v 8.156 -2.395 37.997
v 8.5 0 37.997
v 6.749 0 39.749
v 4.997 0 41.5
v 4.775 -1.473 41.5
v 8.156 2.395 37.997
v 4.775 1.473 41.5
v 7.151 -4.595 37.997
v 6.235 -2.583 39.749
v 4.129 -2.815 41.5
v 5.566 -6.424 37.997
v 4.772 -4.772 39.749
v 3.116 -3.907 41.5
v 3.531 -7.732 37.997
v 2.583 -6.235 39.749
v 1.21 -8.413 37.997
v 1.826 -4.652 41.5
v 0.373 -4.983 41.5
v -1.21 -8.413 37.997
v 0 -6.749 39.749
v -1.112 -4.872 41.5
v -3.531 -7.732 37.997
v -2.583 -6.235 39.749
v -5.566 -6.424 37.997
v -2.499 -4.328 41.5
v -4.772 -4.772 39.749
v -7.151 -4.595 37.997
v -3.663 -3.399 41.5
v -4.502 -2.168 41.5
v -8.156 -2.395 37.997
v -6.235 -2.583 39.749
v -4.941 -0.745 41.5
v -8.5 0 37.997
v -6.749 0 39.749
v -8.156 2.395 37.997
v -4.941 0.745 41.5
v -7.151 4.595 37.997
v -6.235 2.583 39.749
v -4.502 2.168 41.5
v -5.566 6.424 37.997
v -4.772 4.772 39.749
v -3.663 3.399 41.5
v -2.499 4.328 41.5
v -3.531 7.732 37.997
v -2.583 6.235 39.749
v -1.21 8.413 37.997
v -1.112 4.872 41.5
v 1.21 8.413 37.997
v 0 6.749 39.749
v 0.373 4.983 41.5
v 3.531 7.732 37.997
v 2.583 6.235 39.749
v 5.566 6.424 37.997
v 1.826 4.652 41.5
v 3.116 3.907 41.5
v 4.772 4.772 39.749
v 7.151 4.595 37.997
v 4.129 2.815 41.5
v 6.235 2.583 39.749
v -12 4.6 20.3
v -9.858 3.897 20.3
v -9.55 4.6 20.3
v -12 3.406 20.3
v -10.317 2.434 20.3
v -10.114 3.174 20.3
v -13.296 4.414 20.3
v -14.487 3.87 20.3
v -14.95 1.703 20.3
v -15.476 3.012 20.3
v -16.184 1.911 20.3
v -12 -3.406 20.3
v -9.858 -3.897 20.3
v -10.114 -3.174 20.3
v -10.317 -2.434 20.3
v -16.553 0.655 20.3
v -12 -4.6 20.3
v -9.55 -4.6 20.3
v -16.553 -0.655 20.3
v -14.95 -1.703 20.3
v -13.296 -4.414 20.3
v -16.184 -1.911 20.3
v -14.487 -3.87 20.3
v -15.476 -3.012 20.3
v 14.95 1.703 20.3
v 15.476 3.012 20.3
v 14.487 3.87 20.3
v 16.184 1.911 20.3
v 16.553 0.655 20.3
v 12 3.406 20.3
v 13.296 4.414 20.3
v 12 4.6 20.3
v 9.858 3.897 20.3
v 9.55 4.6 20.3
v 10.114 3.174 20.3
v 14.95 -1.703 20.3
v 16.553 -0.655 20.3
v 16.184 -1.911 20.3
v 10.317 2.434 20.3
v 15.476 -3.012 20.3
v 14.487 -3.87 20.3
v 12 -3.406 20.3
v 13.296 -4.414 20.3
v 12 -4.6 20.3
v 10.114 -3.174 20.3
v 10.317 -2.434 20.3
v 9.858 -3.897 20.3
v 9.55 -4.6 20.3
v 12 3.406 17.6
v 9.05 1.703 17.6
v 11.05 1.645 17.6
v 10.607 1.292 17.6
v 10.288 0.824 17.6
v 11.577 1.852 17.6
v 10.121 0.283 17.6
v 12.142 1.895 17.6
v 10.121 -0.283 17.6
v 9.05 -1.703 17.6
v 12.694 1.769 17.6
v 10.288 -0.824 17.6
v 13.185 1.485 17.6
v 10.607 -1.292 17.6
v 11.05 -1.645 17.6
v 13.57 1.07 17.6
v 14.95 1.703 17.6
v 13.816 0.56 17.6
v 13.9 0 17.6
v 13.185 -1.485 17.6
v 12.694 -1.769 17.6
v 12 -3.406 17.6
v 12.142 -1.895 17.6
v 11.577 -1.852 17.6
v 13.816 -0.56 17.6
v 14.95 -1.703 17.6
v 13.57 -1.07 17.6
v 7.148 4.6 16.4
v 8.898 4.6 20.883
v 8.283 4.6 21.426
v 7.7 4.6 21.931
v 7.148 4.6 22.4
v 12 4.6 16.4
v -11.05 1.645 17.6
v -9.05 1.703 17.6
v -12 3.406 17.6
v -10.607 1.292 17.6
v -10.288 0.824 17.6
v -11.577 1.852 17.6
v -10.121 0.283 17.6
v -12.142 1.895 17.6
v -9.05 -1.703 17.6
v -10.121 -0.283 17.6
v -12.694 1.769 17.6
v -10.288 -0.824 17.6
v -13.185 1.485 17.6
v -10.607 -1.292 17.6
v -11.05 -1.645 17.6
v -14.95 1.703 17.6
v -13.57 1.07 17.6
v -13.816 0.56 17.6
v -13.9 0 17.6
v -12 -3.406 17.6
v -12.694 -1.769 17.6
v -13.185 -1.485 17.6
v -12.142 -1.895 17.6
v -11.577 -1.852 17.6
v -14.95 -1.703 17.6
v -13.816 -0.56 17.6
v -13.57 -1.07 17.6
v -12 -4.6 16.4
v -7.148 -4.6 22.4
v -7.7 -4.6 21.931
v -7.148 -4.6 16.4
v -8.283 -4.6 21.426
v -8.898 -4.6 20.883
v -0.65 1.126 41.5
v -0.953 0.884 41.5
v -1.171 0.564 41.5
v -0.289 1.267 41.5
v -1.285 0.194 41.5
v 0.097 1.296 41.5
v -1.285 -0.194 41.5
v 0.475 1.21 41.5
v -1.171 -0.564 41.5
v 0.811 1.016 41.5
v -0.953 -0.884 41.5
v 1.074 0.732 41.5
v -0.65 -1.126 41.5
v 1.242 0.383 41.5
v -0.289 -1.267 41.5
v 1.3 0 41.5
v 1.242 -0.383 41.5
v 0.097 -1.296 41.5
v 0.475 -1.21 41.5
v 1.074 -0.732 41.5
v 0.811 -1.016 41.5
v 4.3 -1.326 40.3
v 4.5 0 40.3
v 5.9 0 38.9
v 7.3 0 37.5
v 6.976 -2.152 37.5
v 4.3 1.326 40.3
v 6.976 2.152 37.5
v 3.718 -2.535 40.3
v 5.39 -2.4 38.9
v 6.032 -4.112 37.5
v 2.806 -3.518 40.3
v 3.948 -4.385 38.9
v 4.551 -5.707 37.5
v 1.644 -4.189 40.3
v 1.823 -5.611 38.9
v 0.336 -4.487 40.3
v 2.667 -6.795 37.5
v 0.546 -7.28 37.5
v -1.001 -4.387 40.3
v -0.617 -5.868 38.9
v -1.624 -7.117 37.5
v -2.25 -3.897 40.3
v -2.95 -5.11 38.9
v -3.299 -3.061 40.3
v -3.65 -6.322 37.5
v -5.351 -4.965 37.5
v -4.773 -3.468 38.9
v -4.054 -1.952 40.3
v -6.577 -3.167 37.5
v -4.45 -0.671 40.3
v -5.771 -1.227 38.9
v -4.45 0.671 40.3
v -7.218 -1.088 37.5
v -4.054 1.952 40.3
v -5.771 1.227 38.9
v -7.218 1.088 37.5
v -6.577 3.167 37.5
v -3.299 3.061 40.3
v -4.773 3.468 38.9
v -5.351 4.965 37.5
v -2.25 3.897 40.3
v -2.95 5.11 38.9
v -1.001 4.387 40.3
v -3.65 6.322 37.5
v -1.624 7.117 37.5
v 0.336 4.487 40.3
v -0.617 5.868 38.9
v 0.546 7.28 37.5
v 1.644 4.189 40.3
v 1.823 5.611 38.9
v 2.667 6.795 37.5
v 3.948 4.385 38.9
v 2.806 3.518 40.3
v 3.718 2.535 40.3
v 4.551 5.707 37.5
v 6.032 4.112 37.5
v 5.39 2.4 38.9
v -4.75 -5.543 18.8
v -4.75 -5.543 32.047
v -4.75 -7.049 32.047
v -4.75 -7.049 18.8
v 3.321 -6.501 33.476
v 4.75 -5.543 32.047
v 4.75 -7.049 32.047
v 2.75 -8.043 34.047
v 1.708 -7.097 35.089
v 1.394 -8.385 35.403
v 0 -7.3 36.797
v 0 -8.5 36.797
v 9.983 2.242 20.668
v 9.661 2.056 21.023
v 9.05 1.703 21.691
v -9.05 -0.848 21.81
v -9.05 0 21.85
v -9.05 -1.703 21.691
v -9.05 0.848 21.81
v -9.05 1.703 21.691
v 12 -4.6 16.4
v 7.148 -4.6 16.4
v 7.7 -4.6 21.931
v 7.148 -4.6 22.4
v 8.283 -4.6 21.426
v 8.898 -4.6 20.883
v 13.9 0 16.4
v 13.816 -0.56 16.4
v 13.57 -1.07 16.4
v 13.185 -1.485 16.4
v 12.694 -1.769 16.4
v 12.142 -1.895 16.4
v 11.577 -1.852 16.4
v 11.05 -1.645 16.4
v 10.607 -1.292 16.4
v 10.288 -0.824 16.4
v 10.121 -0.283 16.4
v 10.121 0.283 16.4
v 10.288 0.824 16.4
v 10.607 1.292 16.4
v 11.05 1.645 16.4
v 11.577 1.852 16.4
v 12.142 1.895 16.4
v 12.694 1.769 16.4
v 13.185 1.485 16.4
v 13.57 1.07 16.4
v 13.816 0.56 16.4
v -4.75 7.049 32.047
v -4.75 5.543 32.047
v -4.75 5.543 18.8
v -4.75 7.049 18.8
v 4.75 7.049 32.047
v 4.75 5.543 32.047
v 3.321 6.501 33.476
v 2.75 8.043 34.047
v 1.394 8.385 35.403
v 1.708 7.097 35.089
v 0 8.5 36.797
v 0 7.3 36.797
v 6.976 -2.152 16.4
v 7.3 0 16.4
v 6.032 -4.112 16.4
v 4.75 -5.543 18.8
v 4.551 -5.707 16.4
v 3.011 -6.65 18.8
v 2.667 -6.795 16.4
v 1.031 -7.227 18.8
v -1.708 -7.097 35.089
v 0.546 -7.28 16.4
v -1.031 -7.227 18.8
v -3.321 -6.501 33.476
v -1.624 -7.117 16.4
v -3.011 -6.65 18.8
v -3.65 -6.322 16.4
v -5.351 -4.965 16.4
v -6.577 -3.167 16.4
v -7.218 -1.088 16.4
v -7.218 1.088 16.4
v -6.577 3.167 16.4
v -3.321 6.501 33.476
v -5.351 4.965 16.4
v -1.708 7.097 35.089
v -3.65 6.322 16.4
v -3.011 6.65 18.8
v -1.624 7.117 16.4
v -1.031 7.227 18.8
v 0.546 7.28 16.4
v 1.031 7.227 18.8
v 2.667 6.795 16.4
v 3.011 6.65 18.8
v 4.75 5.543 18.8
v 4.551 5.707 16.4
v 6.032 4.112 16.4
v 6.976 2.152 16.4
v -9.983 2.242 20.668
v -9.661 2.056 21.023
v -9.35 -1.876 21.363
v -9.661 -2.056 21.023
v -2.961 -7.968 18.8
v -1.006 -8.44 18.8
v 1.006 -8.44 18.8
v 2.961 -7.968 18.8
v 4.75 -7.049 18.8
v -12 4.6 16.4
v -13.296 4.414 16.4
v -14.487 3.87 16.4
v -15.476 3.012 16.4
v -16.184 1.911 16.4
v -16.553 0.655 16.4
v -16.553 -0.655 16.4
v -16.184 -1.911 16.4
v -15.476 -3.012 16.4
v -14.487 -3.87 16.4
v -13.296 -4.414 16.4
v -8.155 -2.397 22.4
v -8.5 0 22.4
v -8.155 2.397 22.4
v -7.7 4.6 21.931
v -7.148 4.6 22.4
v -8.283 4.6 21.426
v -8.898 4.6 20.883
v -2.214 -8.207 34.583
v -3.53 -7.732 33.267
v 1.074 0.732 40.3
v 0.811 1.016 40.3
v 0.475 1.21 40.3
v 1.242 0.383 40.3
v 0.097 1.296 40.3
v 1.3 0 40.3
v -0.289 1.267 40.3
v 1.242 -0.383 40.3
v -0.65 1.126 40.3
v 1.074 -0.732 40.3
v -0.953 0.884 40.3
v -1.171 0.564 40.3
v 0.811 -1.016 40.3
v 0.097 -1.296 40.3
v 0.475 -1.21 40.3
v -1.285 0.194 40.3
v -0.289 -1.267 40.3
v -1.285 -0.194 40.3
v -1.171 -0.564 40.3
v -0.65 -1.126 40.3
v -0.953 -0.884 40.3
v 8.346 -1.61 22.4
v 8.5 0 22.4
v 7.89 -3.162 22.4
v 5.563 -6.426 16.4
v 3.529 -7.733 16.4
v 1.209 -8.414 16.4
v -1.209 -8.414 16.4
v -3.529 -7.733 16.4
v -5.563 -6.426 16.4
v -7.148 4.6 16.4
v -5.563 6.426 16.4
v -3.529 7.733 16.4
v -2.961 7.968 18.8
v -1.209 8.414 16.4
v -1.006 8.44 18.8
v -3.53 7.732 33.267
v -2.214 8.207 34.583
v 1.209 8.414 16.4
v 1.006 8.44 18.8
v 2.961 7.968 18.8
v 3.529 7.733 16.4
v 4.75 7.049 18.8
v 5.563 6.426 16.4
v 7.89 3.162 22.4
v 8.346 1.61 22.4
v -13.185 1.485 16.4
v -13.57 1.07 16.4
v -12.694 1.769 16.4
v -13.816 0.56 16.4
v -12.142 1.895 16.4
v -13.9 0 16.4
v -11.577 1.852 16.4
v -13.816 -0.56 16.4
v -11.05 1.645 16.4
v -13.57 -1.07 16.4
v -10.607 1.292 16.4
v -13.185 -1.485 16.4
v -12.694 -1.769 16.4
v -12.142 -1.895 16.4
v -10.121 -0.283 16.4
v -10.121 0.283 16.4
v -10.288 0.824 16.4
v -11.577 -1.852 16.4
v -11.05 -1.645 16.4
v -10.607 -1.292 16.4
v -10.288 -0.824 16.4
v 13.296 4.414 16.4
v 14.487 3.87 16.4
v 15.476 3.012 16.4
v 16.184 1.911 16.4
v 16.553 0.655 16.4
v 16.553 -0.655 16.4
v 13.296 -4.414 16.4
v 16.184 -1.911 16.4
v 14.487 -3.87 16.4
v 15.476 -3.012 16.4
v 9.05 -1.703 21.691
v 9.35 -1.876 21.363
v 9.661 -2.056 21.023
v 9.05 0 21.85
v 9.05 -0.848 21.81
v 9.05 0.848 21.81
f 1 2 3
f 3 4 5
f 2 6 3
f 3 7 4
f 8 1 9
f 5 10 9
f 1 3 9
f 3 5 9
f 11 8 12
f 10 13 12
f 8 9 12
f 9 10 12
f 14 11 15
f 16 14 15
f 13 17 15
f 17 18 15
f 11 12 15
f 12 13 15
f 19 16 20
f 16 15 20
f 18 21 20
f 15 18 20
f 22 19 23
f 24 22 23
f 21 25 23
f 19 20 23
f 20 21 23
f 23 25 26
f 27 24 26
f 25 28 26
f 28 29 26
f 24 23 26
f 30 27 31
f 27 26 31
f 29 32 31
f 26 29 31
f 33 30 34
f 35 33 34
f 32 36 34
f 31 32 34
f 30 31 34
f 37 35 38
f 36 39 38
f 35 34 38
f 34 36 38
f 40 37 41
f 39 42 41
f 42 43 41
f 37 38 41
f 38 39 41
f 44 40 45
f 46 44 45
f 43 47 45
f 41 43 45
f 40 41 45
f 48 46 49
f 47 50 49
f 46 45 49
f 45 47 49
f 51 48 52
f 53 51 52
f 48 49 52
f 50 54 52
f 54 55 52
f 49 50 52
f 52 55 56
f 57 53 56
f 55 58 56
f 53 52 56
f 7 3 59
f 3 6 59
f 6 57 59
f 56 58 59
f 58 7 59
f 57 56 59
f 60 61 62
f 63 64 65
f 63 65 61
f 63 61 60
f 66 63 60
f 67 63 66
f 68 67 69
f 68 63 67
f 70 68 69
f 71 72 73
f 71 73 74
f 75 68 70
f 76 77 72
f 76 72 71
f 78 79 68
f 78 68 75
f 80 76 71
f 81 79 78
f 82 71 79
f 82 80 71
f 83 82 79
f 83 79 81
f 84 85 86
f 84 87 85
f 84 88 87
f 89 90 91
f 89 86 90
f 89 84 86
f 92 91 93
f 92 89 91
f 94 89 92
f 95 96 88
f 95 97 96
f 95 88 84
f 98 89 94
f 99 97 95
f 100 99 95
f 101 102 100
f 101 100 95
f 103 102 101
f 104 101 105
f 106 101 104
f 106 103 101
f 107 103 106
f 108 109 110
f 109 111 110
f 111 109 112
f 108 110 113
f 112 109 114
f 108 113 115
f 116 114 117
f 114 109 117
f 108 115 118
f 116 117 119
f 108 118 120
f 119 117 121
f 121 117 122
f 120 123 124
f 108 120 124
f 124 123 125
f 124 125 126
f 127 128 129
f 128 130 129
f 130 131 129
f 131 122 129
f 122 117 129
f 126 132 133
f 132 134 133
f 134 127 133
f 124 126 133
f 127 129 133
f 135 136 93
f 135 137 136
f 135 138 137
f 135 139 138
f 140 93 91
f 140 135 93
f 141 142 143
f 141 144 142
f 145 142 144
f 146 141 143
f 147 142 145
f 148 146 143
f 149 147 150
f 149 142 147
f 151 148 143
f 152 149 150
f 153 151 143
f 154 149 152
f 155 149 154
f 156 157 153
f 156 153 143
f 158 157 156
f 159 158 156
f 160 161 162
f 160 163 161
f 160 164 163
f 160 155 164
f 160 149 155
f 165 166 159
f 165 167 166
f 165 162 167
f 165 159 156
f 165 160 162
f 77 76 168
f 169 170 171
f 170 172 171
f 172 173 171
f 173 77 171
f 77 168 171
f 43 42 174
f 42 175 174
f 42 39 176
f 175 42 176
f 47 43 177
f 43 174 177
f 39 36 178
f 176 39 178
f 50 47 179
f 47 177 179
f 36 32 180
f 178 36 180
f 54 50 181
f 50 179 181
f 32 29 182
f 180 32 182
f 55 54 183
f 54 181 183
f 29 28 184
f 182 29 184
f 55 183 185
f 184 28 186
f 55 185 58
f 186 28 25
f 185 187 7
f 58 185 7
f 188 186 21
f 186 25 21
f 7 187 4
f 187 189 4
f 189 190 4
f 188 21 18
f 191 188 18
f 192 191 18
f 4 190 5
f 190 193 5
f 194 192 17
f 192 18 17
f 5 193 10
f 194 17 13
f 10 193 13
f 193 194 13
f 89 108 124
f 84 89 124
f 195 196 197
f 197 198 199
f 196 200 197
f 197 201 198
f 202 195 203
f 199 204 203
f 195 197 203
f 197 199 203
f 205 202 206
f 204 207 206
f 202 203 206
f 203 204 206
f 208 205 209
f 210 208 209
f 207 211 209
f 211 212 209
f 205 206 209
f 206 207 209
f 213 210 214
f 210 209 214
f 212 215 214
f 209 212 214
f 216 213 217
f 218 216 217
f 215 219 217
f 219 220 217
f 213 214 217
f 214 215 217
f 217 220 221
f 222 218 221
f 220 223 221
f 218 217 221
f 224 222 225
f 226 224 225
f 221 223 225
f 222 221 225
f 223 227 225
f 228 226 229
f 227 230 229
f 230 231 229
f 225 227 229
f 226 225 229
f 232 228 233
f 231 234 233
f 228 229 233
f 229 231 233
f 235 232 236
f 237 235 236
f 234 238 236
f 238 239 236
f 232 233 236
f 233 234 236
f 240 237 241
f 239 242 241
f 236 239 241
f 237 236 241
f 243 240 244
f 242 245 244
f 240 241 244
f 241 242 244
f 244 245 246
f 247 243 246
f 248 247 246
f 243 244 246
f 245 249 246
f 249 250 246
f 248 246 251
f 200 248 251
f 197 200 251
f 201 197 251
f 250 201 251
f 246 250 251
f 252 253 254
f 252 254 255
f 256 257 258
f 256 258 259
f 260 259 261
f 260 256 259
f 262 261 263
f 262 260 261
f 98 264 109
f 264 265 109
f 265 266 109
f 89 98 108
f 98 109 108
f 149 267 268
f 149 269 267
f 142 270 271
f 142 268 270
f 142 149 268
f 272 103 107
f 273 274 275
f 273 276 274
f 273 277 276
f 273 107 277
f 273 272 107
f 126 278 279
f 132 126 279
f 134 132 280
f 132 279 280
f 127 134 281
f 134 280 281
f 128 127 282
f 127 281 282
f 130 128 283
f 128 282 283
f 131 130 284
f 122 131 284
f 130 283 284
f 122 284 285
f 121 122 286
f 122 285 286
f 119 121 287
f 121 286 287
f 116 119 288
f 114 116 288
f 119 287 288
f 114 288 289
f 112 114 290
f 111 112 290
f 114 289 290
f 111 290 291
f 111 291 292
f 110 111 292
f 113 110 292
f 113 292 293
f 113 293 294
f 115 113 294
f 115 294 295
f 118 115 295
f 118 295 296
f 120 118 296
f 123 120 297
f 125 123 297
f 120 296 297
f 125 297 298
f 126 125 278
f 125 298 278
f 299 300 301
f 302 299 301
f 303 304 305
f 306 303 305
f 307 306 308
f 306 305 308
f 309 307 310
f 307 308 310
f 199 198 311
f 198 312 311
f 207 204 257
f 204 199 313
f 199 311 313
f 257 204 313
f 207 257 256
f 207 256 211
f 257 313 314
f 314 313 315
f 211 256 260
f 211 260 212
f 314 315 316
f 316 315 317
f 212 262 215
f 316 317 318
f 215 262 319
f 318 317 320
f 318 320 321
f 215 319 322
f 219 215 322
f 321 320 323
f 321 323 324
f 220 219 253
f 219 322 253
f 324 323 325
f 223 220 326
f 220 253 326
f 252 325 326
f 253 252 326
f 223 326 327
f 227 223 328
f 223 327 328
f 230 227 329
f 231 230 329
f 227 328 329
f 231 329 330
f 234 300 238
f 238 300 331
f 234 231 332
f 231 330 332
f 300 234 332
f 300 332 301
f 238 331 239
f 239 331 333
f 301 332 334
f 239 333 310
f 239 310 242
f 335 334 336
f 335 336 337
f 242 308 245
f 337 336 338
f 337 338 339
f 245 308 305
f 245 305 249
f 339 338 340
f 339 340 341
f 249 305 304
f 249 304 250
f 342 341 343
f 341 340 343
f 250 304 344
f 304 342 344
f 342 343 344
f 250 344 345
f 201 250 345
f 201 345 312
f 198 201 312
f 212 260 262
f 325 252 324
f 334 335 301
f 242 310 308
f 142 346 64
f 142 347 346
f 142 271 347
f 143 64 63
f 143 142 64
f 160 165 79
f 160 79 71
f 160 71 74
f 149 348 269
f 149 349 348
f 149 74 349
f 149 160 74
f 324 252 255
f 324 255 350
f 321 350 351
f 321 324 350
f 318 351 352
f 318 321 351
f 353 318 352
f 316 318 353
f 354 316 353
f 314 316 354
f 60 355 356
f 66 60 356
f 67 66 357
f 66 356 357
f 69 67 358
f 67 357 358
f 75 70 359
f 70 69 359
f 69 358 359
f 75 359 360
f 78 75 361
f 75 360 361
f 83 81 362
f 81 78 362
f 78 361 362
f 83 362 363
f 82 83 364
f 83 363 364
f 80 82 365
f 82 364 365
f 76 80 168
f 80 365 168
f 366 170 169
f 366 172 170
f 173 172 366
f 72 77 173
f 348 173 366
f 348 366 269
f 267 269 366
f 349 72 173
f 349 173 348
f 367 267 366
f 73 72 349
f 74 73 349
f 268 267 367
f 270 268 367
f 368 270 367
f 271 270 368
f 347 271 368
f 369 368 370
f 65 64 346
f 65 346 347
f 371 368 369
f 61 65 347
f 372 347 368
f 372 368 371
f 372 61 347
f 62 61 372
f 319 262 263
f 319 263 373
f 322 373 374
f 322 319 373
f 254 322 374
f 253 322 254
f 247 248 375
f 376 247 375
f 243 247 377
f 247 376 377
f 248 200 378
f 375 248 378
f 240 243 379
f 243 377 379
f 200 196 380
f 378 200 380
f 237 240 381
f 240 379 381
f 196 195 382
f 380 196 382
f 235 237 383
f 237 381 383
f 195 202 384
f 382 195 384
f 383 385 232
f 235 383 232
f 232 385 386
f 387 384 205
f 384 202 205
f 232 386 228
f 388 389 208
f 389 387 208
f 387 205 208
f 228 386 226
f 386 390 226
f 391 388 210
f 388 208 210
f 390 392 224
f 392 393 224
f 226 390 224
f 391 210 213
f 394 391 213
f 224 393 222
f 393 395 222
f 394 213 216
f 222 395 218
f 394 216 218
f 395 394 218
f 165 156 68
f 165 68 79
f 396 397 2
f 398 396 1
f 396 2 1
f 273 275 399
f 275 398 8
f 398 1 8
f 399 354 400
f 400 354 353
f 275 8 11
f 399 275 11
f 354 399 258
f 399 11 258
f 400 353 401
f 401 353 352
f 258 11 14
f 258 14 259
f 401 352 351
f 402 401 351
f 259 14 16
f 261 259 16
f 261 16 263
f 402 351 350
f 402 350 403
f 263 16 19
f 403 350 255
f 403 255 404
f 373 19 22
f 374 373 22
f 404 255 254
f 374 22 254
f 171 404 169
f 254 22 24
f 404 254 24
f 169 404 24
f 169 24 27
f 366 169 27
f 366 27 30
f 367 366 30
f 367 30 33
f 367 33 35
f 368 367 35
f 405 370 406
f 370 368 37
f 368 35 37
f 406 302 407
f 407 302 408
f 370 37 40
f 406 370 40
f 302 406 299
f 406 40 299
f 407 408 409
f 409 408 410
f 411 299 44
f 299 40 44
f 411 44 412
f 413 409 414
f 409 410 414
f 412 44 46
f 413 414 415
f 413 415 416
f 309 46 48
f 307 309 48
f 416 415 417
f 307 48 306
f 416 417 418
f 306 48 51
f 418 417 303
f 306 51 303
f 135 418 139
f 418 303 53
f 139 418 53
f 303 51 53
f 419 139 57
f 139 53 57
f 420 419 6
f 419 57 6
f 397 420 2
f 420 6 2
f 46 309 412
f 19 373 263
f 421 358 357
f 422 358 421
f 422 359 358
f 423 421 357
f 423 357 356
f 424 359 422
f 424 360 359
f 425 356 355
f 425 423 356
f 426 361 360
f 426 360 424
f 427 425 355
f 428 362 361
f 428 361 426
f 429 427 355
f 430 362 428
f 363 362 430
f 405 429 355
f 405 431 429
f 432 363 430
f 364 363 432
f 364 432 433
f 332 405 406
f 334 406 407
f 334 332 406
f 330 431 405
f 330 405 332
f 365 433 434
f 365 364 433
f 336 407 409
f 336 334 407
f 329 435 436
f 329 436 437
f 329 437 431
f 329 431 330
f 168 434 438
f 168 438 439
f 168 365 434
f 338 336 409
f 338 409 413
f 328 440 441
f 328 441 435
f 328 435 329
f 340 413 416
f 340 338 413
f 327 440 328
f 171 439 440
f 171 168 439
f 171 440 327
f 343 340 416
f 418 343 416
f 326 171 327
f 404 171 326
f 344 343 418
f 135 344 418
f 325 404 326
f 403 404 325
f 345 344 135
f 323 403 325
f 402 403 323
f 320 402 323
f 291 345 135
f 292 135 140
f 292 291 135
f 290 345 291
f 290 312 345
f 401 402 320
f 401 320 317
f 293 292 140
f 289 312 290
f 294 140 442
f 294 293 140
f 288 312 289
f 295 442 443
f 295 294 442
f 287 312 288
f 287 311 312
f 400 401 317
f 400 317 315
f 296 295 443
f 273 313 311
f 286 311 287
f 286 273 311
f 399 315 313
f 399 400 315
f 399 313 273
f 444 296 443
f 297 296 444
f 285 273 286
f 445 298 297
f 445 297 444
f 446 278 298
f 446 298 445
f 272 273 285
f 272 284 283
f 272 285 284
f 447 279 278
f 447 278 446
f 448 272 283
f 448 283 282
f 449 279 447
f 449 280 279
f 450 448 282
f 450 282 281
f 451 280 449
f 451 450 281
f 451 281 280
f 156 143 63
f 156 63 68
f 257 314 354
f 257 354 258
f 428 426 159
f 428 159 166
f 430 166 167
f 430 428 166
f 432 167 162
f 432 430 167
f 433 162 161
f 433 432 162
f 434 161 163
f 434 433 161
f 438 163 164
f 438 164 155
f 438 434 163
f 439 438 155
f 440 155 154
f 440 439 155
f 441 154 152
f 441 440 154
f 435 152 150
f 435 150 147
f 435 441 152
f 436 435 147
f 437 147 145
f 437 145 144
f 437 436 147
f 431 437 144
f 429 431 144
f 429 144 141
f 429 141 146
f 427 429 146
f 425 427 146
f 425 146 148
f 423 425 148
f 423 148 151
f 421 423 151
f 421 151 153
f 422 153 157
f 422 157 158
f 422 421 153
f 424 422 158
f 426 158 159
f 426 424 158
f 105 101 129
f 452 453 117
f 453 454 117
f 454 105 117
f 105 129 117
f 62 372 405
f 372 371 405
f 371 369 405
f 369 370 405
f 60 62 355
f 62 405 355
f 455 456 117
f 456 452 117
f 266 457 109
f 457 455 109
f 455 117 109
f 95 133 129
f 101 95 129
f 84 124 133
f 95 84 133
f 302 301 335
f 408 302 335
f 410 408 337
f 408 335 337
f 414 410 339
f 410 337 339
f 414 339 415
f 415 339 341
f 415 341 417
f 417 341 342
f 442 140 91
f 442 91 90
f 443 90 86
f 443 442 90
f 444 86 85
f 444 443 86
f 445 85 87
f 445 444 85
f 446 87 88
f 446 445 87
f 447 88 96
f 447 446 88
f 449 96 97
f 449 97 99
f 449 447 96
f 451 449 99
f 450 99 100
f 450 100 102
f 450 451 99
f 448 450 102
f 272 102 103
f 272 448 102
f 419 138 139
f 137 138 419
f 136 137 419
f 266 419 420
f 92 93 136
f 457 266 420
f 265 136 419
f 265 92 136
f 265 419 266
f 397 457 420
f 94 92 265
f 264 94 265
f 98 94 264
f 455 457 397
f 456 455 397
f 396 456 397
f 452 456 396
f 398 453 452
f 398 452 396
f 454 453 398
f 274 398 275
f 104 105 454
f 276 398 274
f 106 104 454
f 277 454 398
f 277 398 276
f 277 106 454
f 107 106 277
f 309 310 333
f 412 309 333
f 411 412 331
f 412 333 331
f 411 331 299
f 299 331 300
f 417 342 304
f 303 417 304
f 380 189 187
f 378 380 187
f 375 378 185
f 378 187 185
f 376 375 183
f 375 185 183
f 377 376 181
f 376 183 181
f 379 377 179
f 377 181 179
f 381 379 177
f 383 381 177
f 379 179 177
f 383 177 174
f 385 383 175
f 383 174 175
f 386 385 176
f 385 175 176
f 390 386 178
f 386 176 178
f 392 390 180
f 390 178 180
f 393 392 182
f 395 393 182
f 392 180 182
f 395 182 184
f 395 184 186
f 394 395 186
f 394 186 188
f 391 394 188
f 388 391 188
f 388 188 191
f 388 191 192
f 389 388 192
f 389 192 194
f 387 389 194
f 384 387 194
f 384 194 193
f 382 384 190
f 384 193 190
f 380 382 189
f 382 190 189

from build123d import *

# Parameters (mm, degrees)
F4_DEPTH       = 6
F9_DEPTH       = 4.251
F10_R          = 1.9
F11_DEPTH      = 1.2
F13_DEPTH      = 8.501
F13_DEPTH_BACK = 8.501
F15_R          = 1.3
F16_DEPTH      = 1.2


# Not quite as in the source:
# - a pattern or mirror of a feature is missing from the dataset's text; its kind, count and spacing are read off the source's solid


with BuildPart() as f2:
    # F1 (on Front) → F2 (revolve)
    with BuildSketch(Plane.XZ):
        Polygon((7.3, 37.5), (7.3, 16.4), (8.5, 16.4), (8.5, 37.9970562748), (4.9970562748, 41.5), (0, 41.5), (0, 40.3), (4.5, 40.3), align=None)
    revolve(axis=Axis((0, 0, 13.2), (0, 0, -1)))

    # F3 (on face) → F4 (join)
    with BuildSketch(Plane(origin=(0, 0, 16.4), x_dir=(1, 0, 0), z_dir=(0, 0, -1))):
        with BuildLine():
            Line((7.1477269114, -4.6), (12, -4.6))
            ThreePointArc((12, -4.6), (16.6, 0), (12, 4.6))
            Line((12, 4.6), (7.1477269114, 4.6))
            ThreePointArc((7.1477269114, 4.6), (8.5, 0), (7.1477269114, -4.6))
        make_face()
    f4 = extrude(amount=-F4_DEPTH)

    # F4_copies: F4 across plane
    add(f4.mirror(Plane(origin=(0, 0, 0), x_dir=(0, 0, -1), z_dir=(-1, 0, 0))))

    # F7 (on Front) → F8 (revolve, cut)
    with BuildSketch(Plane.XZ):
        Polygon((8.5, 22.4), (10.6, 20.3), (16.6, 20.3), (16.6, 22.4), align=None)
    revolve(axis=Axis((0, 0, 13.2), (0, 0, -1)), mode=Mode.SUBTRACT)

    # F6 (on offset) → F9 (cut, through all)
    with BuildSketch(Plane(origin=(0, 0, 17.6), x_dir=(1, 0, 0), z_dir=(0, 0, -1))):
        Polygon((12, -3.4063665882), (14.95, -1.7031832941), (14.95, 1.7031832941), (12, 3.4063665882), (9.05, 1.7031832941), (9.05, -1.7031832941), align=None)
    f9 = extrude(amount=-F9_DEPTH, mode=Mode.SUBTRACT)

    # F9_copies: F9 across plane
    add(f9.mirror(Plane(origin=(0, 0, 0), x_dir=(0, 0, -1), z_dir=(-1, 0, 0))), mode=Mode.SUBTRACT)

    # F10 (on face) → F11 (cut, through all)
    with BuildSketch(Plane(origin=(0, 0, 16.4), x_dir=(1, 0, 0), z_dir=(0, 0, -1))):
        with Locations((12, 0)):
            Circle(F10_R)
    f11 = extrude(amount=-F11_DEPTH, mode=Mode.SUBTRACT)

    # F11_copies: F11 across plane
    add(f11.mirror(Plane(origin=(0, 0, 0), x_dir=(0, 0, -1), z_dir=(-1, 0, 0))), mode=Mode.SUBTRACT)

    # F12 (on Front) → F13 (cut, two sides)
    with BuildSketch(Plane.XZ) as f13_sk:
        Polygon((-4.75, 32.0470562748), (-4.75, 18.8), (4.75, 18.8), (4.75, 32.0470562748), (0, 36.7970562748), align=None)
    extrude(amount=-F13_DEPTH, mode=Mode.SUBTRACT)
    extrude(f13_sk.sketch, amount=F13_DEPTH_BACK, mode=Mode.SUBTRACT)

    # F15 (on face) → F16 (cut, through all)
    with BuildSketch(Plane.XY.offset(41.5)):
        Circle(F15_R)
    extrude(amount=-F16_DEPTH, mode=Mode.SUBTRACT)


solid = f2.part
